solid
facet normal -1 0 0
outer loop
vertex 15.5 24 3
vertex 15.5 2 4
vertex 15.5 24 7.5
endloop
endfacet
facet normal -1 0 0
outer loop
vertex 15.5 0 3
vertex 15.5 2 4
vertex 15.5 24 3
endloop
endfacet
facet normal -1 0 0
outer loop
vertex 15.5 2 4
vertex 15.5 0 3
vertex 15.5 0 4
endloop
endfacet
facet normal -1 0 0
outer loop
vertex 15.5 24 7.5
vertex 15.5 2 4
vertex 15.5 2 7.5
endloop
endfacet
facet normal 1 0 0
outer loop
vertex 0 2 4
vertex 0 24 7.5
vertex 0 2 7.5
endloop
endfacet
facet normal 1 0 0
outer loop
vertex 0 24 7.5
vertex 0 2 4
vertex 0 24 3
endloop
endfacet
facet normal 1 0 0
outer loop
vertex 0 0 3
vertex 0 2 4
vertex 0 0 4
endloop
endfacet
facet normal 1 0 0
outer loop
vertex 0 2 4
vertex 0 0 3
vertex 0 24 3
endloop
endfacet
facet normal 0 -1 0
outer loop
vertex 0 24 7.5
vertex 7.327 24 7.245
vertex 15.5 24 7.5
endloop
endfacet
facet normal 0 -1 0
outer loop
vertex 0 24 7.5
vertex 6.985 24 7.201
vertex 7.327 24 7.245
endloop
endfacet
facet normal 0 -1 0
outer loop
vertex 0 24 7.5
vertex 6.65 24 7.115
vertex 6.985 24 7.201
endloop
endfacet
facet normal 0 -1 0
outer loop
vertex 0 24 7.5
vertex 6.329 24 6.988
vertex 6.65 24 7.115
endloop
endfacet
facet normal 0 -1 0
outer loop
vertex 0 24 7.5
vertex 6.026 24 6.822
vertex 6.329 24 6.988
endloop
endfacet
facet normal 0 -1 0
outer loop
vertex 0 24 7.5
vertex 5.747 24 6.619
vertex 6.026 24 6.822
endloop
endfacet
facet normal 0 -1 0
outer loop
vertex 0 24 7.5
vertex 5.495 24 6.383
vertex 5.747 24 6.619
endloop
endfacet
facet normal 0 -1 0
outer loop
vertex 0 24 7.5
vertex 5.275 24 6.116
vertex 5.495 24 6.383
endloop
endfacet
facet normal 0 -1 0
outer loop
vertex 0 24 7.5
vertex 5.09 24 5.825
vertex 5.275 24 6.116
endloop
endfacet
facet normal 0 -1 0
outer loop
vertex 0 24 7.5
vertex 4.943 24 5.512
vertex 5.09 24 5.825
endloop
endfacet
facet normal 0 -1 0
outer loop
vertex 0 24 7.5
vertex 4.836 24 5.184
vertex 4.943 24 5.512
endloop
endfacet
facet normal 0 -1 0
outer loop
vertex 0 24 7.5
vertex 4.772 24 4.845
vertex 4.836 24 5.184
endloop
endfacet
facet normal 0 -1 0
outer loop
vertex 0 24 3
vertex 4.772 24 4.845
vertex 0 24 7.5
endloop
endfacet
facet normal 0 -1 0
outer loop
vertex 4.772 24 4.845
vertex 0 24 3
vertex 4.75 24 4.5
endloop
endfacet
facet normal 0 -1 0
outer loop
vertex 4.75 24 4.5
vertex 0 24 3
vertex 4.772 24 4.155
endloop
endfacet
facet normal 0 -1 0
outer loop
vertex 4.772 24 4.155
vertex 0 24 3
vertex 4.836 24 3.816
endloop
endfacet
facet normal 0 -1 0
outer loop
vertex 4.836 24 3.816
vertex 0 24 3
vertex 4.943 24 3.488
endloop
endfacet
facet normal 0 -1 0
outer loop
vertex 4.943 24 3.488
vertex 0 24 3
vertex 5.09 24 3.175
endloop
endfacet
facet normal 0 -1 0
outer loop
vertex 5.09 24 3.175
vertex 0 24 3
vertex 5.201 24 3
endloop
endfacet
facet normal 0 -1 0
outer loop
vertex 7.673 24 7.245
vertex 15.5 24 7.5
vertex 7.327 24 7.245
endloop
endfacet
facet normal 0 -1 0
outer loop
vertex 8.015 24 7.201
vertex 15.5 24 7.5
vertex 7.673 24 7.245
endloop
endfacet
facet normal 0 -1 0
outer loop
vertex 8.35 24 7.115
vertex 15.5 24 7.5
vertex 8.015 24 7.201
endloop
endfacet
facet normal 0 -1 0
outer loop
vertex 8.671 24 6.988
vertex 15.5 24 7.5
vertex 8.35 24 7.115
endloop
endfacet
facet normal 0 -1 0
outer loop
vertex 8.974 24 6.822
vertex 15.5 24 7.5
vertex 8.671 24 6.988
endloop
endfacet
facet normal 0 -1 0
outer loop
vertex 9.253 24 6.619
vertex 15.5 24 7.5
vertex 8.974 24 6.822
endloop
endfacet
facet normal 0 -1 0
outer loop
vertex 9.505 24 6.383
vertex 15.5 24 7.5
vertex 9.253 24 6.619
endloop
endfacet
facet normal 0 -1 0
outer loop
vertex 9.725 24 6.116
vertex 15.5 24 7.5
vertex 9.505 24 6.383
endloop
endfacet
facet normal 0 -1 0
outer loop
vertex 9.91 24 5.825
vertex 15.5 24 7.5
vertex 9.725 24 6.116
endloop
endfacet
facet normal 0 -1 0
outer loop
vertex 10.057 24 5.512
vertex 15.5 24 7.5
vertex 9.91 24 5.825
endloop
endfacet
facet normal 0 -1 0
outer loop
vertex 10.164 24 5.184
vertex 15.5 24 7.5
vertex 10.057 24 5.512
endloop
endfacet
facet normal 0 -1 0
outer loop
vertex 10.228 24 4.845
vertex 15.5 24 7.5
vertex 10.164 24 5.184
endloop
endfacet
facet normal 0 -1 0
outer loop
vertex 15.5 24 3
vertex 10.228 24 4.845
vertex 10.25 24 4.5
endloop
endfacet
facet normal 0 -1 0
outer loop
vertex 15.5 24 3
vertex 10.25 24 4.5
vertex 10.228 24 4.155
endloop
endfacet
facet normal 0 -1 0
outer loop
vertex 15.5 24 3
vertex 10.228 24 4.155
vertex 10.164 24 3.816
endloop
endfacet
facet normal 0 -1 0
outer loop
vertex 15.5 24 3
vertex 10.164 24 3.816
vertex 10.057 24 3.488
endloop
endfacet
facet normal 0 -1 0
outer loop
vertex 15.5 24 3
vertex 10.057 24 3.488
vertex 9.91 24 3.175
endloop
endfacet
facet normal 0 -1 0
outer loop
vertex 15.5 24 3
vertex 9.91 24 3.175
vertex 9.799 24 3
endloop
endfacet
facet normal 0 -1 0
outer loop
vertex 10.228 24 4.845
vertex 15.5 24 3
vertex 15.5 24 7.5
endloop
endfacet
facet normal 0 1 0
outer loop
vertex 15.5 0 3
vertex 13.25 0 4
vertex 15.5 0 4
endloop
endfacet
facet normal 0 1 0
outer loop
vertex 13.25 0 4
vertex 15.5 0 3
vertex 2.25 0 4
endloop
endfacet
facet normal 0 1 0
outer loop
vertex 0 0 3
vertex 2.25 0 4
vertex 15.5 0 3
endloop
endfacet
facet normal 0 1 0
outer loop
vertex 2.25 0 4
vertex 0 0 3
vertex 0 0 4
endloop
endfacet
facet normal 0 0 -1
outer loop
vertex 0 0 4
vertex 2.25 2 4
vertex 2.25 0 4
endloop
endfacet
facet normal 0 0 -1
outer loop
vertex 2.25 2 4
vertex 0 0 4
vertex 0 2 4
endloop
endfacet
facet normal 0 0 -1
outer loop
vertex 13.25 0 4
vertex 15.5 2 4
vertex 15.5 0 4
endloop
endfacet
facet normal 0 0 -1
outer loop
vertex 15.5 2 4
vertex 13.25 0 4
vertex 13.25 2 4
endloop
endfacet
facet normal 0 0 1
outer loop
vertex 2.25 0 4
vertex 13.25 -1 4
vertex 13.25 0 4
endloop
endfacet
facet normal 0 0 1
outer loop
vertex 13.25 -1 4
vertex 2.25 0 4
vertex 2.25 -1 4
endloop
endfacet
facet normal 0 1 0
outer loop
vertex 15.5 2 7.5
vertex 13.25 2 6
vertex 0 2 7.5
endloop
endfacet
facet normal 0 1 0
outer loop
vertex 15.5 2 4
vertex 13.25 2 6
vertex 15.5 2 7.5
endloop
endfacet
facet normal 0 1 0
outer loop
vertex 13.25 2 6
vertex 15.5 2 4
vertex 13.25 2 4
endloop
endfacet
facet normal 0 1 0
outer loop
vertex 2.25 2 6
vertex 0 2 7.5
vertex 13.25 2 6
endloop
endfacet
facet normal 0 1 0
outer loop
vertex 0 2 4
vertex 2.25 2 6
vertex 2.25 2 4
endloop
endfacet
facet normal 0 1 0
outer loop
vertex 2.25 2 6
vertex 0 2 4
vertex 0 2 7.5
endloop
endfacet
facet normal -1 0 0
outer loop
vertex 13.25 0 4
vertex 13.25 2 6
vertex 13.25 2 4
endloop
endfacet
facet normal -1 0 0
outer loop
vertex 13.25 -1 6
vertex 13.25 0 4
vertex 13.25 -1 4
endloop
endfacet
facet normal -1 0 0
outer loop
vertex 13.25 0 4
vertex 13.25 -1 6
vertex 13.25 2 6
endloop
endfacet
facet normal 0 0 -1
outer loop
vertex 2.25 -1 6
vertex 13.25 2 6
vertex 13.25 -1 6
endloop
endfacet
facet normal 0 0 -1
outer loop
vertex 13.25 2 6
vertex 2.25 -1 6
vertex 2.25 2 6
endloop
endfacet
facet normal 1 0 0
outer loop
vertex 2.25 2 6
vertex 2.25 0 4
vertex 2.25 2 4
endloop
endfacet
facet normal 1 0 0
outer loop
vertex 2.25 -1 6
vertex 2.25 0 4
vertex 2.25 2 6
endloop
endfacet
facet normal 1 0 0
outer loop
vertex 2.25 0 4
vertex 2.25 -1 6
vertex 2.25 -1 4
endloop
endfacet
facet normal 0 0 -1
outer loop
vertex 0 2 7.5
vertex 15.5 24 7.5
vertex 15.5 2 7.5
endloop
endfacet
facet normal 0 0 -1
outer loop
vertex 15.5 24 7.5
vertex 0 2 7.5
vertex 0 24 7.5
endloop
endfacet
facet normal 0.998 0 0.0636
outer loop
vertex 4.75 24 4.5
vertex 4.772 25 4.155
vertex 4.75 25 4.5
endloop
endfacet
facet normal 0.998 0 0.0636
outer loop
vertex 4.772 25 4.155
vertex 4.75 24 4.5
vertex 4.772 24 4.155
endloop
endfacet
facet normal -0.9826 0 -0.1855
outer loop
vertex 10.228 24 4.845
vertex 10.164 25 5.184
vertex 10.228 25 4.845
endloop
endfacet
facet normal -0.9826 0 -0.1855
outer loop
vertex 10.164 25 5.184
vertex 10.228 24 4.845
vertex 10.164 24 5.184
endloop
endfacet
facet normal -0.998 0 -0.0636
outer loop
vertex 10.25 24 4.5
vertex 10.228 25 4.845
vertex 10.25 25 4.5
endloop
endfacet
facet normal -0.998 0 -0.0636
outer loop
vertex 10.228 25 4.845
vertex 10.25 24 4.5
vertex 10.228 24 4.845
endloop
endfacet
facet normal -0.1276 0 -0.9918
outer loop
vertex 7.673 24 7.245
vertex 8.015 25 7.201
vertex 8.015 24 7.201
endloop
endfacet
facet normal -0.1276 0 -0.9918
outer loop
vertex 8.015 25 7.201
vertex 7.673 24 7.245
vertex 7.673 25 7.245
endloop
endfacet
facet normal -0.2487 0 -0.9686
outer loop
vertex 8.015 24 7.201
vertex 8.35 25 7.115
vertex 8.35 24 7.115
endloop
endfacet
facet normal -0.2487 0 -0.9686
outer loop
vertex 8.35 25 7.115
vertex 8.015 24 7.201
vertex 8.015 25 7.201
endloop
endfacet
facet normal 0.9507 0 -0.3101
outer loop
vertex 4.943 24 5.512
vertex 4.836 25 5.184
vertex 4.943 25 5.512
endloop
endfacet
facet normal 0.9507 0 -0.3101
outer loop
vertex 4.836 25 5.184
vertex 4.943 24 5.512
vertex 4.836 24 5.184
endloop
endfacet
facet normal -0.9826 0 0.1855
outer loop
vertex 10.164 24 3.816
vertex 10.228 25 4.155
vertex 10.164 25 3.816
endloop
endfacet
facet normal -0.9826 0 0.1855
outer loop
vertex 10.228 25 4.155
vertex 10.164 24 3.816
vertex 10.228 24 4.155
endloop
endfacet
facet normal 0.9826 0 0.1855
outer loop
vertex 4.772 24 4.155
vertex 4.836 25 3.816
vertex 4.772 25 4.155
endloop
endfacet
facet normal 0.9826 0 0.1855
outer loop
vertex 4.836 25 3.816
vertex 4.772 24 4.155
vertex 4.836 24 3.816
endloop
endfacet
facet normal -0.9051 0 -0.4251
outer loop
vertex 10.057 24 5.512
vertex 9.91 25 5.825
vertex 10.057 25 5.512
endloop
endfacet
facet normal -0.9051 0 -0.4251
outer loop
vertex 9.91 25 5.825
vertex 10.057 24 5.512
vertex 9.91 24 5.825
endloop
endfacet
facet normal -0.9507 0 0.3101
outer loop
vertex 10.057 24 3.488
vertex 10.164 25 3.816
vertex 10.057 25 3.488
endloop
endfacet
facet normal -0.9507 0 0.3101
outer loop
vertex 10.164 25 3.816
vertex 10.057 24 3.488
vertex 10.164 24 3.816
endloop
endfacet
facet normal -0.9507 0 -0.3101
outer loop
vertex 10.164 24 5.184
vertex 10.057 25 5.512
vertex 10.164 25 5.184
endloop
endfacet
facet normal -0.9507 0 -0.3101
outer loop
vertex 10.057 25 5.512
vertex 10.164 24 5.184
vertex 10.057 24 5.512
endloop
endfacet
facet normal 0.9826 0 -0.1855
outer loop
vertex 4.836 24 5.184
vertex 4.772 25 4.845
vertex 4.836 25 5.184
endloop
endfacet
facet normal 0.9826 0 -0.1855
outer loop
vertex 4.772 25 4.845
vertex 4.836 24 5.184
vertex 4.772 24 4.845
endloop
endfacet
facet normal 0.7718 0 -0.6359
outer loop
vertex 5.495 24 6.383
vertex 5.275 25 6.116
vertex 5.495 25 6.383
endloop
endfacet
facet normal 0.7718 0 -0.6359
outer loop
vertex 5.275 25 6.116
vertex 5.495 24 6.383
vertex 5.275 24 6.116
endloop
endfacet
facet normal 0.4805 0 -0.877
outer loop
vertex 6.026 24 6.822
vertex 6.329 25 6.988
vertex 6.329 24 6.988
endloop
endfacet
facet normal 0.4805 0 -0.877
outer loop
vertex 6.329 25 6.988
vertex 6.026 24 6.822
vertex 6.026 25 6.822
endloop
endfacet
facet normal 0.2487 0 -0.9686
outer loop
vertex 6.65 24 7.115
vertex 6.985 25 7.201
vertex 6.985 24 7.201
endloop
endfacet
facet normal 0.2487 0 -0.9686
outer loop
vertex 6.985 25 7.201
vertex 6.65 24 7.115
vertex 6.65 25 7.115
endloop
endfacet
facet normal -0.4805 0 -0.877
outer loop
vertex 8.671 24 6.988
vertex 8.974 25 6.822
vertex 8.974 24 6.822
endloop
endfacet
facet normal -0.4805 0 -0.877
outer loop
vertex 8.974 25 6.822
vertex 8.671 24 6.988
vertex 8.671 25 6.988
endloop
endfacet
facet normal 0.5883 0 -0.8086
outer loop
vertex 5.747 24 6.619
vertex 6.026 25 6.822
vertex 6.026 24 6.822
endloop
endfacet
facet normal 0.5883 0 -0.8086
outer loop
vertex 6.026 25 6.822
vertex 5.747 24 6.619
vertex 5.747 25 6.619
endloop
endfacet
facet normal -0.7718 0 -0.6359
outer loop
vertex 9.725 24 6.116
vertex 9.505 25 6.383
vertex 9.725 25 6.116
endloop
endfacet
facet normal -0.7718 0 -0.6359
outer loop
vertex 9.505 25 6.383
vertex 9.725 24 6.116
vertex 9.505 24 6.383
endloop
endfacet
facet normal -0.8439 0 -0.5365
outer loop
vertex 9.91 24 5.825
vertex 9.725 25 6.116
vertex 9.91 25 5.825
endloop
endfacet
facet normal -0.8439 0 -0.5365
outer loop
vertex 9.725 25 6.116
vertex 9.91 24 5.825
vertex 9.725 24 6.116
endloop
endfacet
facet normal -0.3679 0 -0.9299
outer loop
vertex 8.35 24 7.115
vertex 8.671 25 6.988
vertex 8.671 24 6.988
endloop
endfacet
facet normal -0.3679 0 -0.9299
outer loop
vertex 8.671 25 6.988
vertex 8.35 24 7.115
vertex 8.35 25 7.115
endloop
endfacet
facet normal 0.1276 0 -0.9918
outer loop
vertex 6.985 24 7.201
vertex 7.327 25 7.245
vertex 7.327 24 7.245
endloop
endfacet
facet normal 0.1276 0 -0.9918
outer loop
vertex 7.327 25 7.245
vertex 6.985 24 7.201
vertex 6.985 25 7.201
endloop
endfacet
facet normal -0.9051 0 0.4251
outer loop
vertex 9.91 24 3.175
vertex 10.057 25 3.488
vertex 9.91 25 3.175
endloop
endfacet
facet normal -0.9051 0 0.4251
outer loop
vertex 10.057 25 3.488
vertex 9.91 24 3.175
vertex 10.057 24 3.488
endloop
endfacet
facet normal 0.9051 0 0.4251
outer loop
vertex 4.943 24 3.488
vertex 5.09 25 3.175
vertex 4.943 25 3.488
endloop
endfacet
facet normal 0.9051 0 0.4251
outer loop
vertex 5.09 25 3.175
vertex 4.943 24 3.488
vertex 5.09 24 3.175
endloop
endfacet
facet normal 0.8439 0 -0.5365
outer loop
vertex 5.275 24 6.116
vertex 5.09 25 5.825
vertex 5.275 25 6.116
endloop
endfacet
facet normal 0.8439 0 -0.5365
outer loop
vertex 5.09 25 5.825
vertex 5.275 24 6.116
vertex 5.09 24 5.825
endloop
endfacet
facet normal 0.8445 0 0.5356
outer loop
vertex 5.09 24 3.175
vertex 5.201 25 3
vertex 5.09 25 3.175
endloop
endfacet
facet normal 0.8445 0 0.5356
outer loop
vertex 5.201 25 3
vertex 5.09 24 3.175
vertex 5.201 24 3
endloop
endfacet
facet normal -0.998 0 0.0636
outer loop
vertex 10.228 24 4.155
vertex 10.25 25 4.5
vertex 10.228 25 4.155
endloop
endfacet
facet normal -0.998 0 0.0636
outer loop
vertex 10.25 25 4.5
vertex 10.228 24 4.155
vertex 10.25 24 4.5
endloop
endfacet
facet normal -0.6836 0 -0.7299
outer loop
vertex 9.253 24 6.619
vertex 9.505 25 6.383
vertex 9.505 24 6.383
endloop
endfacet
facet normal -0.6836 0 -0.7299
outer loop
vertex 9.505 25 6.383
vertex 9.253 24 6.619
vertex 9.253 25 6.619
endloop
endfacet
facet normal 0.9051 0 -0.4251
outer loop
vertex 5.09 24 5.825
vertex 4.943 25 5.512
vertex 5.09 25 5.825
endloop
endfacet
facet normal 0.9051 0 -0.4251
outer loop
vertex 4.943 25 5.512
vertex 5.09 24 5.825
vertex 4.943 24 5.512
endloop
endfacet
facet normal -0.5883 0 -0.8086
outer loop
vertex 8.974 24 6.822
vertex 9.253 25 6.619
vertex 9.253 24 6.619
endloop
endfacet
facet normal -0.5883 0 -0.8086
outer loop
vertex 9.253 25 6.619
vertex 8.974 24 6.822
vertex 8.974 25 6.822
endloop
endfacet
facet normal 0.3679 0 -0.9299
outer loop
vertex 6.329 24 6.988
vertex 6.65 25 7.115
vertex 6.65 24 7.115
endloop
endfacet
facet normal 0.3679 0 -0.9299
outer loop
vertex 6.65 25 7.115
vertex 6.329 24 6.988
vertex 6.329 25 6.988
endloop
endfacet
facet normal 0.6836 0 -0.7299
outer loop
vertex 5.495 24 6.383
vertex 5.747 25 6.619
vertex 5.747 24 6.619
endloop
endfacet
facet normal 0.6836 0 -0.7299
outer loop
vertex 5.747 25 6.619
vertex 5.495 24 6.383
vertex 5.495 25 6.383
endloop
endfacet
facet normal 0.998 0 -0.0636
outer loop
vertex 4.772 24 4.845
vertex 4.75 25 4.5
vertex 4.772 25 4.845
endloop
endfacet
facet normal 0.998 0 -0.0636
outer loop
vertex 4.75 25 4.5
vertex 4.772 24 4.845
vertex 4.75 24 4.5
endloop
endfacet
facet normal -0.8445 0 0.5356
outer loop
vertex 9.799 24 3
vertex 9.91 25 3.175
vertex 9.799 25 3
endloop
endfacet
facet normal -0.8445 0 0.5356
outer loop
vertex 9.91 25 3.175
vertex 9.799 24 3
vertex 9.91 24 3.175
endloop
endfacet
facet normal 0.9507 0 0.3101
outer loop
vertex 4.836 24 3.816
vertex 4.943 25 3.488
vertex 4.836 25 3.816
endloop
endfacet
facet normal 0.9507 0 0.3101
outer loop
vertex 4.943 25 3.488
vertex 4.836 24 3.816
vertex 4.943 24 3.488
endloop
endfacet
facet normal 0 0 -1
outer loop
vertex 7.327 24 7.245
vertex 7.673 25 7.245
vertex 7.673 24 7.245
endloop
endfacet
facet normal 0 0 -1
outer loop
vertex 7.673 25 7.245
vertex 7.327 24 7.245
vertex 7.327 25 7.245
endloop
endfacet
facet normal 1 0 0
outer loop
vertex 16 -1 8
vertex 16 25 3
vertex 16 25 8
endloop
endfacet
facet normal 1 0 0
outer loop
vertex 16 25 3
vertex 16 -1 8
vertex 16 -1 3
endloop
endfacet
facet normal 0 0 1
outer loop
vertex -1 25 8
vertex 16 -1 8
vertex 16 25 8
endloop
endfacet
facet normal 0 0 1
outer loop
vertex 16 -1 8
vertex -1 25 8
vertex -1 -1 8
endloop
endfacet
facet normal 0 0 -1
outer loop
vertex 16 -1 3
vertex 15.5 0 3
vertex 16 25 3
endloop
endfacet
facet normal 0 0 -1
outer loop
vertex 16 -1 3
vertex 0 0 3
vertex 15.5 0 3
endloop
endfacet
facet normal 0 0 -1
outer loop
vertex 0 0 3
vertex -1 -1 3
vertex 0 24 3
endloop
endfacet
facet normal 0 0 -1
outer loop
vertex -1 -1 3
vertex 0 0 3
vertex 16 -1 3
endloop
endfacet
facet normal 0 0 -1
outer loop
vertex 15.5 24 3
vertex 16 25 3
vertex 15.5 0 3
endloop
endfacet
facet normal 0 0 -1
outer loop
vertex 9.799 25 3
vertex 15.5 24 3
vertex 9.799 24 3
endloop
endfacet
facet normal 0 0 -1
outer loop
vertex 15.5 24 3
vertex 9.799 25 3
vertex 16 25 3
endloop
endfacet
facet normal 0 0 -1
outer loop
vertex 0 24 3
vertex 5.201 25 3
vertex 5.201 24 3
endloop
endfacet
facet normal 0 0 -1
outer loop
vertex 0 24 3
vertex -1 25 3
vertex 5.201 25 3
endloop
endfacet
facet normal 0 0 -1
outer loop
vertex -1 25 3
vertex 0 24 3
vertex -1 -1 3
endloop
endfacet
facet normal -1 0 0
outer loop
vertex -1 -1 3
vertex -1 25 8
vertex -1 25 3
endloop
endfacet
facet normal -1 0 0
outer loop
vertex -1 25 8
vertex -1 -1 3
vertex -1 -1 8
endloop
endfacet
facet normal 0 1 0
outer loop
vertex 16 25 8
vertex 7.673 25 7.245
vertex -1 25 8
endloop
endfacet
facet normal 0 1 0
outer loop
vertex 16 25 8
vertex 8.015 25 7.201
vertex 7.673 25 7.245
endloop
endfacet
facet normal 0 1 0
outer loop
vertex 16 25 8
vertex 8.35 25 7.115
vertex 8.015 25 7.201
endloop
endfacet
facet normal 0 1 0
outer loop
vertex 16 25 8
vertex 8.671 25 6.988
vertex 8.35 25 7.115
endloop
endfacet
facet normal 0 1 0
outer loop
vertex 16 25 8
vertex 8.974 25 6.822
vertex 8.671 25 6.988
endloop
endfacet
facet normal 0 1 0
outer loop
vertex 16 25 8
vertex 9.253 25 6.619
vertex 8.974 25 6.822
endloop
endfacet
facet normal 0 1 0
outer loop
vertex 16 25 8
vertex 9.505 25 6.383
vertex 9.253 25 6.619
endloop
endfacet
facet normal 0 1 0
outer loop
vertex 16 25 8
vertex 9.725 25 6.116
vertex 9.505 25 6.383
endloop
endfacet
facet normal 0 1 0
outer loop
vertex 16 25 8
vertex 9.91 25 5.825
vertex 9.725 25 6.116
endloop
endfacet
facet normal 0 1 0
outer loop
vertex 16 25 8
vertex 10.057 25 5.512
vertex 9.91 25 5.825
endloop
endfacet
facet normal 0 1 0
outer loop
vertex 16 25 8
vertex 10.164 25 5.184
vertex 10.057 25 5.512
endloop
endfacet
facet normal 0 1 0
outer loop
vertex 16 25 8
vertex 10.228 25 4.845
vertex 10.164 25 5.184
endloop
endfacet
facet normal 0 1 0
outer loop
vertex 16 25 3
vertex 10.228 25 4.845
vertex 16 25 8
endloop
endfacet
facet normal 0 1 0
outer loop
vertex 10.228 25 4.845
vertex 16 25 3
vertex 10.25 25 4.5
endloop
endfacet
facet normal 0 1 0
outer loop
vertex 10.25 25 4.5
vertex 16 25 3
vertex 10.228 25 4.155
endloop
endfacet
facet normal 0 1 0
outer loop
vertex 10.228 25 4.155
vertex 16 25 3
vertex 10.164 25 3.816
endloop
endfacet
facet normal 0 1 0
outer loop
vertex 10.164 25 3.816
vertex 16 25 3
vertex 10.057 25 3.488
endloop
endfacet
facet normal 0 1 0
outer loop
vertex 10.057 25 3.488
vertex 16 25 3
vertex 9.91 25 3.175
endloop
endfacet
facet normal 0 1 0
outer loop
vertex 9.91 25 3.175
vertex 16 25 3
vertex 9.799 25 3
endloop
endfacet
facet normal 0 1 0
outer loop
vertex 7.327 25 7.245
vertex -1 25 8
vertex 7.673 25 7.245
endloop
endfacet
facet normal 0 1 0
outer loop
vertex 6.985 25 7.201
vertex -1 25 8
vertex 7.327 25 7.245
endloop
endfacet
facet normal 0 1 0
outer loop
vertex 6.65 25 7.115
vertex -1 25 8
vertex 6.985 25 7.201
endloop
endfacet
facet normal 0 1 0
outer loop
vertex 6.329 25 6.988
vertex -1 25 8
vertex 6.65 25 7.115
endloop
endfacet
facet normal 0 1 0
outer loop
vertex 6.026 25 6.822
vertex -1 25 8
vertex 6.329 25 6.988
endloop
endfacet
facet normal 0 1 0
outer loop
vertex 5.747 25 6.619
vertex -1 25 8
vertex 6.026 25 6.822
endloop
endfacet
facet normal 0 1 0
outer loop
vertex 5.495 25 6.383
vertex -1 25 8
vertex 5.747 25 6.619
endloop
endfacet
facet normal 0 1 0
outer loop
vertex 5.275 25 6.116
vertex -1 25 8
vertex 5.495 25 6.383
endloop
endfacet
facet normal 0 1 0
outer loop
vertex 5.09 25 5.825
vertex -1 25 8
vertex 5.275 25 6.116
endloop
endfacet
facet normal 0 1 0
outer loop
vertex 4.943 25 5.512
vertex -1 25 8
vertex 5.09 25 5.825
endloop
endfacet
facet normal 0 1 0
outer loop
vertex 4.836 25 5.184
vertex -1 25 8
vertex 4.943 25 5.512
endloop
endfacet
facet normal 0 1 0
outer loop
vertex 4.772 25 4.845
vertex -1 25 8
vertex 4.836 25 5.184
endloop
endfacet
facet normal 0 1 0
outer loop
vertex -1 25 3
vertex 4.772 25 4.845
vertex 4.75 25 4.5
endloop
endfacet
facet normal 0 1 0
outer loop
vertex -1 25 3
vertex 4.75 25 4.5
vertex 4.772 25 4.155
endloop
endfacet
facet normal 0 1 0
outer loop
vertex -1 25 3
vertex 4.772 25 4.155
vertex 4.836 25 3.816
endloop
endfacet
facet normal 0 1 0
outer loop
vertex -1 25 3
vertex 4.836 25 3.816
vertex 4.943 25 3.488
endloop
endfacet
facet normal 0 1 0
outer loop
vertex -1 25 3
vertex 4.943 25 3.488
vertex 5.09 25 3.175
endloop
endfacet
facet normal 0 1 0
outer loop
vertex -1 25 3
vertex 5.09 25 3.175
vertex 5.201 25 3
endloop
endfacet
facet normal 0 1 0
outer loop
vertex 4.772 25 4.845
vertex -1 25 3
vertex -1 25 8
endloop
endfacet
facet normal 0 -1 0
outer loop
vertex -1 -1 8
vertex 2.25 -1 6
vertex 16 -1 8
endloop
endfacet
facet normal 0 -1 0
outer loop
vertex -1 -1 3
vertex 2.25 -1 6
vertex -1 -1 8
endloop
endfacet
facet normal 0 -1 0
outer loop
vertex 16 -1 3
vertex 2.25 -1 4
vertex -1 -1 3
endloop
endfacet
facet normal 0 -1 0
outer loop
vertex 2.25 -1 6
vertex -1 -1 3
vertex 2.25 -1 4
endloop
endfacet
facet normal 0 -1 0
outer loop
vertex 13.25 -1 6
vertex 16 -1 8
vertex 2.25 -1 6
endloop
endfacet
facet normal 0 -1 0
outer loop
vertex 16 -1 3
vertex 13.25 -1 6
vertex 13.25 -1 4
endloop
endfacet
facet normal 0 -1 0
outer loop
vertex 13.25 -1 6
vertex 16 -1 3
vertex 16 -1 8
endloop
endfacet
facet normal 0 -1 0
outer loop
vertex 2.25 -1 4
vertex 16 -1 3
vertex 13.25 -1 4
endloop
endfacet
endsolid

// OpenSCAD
module board() {
  union() {
    //Board
    color("Green", 0.25) cube([15.5, 24, 2]);
    //Solded components space
    //translate([1, 1, -1])
    //  cube([13, 22, 1]);
    //Black plastic space
    color("Red", 0.25) translate([0, 0, 2]) cube([15.5, 2, 2]);
    //Connection pins (the 3 of them)
    color("Pink", 0.25) translate([2.25, -6, 4]) cube([11, 8, 2]);
    //Photo resistor connection space
    color("Cyan", 0.25) translate([0, 2, 2]) cube([15.5, 22, 5.5]);
    //Photo resistor
    translate([7.5,26,4.5]) rotate([90,0,0]) cylinder(5,2.75,2.75,$fn=50);
  }
}

module bottom() {
  difference() {
    color("blue", 0.5) translate([-1,-1,-1]) cube([17,26,4]);
    board();
  }
}

module top() {
  difference() {
    color("brown", 0.5) translate([-1,-1,3]) cube([17,26,5]);
    board();
  }
}

top();
//bottom();
